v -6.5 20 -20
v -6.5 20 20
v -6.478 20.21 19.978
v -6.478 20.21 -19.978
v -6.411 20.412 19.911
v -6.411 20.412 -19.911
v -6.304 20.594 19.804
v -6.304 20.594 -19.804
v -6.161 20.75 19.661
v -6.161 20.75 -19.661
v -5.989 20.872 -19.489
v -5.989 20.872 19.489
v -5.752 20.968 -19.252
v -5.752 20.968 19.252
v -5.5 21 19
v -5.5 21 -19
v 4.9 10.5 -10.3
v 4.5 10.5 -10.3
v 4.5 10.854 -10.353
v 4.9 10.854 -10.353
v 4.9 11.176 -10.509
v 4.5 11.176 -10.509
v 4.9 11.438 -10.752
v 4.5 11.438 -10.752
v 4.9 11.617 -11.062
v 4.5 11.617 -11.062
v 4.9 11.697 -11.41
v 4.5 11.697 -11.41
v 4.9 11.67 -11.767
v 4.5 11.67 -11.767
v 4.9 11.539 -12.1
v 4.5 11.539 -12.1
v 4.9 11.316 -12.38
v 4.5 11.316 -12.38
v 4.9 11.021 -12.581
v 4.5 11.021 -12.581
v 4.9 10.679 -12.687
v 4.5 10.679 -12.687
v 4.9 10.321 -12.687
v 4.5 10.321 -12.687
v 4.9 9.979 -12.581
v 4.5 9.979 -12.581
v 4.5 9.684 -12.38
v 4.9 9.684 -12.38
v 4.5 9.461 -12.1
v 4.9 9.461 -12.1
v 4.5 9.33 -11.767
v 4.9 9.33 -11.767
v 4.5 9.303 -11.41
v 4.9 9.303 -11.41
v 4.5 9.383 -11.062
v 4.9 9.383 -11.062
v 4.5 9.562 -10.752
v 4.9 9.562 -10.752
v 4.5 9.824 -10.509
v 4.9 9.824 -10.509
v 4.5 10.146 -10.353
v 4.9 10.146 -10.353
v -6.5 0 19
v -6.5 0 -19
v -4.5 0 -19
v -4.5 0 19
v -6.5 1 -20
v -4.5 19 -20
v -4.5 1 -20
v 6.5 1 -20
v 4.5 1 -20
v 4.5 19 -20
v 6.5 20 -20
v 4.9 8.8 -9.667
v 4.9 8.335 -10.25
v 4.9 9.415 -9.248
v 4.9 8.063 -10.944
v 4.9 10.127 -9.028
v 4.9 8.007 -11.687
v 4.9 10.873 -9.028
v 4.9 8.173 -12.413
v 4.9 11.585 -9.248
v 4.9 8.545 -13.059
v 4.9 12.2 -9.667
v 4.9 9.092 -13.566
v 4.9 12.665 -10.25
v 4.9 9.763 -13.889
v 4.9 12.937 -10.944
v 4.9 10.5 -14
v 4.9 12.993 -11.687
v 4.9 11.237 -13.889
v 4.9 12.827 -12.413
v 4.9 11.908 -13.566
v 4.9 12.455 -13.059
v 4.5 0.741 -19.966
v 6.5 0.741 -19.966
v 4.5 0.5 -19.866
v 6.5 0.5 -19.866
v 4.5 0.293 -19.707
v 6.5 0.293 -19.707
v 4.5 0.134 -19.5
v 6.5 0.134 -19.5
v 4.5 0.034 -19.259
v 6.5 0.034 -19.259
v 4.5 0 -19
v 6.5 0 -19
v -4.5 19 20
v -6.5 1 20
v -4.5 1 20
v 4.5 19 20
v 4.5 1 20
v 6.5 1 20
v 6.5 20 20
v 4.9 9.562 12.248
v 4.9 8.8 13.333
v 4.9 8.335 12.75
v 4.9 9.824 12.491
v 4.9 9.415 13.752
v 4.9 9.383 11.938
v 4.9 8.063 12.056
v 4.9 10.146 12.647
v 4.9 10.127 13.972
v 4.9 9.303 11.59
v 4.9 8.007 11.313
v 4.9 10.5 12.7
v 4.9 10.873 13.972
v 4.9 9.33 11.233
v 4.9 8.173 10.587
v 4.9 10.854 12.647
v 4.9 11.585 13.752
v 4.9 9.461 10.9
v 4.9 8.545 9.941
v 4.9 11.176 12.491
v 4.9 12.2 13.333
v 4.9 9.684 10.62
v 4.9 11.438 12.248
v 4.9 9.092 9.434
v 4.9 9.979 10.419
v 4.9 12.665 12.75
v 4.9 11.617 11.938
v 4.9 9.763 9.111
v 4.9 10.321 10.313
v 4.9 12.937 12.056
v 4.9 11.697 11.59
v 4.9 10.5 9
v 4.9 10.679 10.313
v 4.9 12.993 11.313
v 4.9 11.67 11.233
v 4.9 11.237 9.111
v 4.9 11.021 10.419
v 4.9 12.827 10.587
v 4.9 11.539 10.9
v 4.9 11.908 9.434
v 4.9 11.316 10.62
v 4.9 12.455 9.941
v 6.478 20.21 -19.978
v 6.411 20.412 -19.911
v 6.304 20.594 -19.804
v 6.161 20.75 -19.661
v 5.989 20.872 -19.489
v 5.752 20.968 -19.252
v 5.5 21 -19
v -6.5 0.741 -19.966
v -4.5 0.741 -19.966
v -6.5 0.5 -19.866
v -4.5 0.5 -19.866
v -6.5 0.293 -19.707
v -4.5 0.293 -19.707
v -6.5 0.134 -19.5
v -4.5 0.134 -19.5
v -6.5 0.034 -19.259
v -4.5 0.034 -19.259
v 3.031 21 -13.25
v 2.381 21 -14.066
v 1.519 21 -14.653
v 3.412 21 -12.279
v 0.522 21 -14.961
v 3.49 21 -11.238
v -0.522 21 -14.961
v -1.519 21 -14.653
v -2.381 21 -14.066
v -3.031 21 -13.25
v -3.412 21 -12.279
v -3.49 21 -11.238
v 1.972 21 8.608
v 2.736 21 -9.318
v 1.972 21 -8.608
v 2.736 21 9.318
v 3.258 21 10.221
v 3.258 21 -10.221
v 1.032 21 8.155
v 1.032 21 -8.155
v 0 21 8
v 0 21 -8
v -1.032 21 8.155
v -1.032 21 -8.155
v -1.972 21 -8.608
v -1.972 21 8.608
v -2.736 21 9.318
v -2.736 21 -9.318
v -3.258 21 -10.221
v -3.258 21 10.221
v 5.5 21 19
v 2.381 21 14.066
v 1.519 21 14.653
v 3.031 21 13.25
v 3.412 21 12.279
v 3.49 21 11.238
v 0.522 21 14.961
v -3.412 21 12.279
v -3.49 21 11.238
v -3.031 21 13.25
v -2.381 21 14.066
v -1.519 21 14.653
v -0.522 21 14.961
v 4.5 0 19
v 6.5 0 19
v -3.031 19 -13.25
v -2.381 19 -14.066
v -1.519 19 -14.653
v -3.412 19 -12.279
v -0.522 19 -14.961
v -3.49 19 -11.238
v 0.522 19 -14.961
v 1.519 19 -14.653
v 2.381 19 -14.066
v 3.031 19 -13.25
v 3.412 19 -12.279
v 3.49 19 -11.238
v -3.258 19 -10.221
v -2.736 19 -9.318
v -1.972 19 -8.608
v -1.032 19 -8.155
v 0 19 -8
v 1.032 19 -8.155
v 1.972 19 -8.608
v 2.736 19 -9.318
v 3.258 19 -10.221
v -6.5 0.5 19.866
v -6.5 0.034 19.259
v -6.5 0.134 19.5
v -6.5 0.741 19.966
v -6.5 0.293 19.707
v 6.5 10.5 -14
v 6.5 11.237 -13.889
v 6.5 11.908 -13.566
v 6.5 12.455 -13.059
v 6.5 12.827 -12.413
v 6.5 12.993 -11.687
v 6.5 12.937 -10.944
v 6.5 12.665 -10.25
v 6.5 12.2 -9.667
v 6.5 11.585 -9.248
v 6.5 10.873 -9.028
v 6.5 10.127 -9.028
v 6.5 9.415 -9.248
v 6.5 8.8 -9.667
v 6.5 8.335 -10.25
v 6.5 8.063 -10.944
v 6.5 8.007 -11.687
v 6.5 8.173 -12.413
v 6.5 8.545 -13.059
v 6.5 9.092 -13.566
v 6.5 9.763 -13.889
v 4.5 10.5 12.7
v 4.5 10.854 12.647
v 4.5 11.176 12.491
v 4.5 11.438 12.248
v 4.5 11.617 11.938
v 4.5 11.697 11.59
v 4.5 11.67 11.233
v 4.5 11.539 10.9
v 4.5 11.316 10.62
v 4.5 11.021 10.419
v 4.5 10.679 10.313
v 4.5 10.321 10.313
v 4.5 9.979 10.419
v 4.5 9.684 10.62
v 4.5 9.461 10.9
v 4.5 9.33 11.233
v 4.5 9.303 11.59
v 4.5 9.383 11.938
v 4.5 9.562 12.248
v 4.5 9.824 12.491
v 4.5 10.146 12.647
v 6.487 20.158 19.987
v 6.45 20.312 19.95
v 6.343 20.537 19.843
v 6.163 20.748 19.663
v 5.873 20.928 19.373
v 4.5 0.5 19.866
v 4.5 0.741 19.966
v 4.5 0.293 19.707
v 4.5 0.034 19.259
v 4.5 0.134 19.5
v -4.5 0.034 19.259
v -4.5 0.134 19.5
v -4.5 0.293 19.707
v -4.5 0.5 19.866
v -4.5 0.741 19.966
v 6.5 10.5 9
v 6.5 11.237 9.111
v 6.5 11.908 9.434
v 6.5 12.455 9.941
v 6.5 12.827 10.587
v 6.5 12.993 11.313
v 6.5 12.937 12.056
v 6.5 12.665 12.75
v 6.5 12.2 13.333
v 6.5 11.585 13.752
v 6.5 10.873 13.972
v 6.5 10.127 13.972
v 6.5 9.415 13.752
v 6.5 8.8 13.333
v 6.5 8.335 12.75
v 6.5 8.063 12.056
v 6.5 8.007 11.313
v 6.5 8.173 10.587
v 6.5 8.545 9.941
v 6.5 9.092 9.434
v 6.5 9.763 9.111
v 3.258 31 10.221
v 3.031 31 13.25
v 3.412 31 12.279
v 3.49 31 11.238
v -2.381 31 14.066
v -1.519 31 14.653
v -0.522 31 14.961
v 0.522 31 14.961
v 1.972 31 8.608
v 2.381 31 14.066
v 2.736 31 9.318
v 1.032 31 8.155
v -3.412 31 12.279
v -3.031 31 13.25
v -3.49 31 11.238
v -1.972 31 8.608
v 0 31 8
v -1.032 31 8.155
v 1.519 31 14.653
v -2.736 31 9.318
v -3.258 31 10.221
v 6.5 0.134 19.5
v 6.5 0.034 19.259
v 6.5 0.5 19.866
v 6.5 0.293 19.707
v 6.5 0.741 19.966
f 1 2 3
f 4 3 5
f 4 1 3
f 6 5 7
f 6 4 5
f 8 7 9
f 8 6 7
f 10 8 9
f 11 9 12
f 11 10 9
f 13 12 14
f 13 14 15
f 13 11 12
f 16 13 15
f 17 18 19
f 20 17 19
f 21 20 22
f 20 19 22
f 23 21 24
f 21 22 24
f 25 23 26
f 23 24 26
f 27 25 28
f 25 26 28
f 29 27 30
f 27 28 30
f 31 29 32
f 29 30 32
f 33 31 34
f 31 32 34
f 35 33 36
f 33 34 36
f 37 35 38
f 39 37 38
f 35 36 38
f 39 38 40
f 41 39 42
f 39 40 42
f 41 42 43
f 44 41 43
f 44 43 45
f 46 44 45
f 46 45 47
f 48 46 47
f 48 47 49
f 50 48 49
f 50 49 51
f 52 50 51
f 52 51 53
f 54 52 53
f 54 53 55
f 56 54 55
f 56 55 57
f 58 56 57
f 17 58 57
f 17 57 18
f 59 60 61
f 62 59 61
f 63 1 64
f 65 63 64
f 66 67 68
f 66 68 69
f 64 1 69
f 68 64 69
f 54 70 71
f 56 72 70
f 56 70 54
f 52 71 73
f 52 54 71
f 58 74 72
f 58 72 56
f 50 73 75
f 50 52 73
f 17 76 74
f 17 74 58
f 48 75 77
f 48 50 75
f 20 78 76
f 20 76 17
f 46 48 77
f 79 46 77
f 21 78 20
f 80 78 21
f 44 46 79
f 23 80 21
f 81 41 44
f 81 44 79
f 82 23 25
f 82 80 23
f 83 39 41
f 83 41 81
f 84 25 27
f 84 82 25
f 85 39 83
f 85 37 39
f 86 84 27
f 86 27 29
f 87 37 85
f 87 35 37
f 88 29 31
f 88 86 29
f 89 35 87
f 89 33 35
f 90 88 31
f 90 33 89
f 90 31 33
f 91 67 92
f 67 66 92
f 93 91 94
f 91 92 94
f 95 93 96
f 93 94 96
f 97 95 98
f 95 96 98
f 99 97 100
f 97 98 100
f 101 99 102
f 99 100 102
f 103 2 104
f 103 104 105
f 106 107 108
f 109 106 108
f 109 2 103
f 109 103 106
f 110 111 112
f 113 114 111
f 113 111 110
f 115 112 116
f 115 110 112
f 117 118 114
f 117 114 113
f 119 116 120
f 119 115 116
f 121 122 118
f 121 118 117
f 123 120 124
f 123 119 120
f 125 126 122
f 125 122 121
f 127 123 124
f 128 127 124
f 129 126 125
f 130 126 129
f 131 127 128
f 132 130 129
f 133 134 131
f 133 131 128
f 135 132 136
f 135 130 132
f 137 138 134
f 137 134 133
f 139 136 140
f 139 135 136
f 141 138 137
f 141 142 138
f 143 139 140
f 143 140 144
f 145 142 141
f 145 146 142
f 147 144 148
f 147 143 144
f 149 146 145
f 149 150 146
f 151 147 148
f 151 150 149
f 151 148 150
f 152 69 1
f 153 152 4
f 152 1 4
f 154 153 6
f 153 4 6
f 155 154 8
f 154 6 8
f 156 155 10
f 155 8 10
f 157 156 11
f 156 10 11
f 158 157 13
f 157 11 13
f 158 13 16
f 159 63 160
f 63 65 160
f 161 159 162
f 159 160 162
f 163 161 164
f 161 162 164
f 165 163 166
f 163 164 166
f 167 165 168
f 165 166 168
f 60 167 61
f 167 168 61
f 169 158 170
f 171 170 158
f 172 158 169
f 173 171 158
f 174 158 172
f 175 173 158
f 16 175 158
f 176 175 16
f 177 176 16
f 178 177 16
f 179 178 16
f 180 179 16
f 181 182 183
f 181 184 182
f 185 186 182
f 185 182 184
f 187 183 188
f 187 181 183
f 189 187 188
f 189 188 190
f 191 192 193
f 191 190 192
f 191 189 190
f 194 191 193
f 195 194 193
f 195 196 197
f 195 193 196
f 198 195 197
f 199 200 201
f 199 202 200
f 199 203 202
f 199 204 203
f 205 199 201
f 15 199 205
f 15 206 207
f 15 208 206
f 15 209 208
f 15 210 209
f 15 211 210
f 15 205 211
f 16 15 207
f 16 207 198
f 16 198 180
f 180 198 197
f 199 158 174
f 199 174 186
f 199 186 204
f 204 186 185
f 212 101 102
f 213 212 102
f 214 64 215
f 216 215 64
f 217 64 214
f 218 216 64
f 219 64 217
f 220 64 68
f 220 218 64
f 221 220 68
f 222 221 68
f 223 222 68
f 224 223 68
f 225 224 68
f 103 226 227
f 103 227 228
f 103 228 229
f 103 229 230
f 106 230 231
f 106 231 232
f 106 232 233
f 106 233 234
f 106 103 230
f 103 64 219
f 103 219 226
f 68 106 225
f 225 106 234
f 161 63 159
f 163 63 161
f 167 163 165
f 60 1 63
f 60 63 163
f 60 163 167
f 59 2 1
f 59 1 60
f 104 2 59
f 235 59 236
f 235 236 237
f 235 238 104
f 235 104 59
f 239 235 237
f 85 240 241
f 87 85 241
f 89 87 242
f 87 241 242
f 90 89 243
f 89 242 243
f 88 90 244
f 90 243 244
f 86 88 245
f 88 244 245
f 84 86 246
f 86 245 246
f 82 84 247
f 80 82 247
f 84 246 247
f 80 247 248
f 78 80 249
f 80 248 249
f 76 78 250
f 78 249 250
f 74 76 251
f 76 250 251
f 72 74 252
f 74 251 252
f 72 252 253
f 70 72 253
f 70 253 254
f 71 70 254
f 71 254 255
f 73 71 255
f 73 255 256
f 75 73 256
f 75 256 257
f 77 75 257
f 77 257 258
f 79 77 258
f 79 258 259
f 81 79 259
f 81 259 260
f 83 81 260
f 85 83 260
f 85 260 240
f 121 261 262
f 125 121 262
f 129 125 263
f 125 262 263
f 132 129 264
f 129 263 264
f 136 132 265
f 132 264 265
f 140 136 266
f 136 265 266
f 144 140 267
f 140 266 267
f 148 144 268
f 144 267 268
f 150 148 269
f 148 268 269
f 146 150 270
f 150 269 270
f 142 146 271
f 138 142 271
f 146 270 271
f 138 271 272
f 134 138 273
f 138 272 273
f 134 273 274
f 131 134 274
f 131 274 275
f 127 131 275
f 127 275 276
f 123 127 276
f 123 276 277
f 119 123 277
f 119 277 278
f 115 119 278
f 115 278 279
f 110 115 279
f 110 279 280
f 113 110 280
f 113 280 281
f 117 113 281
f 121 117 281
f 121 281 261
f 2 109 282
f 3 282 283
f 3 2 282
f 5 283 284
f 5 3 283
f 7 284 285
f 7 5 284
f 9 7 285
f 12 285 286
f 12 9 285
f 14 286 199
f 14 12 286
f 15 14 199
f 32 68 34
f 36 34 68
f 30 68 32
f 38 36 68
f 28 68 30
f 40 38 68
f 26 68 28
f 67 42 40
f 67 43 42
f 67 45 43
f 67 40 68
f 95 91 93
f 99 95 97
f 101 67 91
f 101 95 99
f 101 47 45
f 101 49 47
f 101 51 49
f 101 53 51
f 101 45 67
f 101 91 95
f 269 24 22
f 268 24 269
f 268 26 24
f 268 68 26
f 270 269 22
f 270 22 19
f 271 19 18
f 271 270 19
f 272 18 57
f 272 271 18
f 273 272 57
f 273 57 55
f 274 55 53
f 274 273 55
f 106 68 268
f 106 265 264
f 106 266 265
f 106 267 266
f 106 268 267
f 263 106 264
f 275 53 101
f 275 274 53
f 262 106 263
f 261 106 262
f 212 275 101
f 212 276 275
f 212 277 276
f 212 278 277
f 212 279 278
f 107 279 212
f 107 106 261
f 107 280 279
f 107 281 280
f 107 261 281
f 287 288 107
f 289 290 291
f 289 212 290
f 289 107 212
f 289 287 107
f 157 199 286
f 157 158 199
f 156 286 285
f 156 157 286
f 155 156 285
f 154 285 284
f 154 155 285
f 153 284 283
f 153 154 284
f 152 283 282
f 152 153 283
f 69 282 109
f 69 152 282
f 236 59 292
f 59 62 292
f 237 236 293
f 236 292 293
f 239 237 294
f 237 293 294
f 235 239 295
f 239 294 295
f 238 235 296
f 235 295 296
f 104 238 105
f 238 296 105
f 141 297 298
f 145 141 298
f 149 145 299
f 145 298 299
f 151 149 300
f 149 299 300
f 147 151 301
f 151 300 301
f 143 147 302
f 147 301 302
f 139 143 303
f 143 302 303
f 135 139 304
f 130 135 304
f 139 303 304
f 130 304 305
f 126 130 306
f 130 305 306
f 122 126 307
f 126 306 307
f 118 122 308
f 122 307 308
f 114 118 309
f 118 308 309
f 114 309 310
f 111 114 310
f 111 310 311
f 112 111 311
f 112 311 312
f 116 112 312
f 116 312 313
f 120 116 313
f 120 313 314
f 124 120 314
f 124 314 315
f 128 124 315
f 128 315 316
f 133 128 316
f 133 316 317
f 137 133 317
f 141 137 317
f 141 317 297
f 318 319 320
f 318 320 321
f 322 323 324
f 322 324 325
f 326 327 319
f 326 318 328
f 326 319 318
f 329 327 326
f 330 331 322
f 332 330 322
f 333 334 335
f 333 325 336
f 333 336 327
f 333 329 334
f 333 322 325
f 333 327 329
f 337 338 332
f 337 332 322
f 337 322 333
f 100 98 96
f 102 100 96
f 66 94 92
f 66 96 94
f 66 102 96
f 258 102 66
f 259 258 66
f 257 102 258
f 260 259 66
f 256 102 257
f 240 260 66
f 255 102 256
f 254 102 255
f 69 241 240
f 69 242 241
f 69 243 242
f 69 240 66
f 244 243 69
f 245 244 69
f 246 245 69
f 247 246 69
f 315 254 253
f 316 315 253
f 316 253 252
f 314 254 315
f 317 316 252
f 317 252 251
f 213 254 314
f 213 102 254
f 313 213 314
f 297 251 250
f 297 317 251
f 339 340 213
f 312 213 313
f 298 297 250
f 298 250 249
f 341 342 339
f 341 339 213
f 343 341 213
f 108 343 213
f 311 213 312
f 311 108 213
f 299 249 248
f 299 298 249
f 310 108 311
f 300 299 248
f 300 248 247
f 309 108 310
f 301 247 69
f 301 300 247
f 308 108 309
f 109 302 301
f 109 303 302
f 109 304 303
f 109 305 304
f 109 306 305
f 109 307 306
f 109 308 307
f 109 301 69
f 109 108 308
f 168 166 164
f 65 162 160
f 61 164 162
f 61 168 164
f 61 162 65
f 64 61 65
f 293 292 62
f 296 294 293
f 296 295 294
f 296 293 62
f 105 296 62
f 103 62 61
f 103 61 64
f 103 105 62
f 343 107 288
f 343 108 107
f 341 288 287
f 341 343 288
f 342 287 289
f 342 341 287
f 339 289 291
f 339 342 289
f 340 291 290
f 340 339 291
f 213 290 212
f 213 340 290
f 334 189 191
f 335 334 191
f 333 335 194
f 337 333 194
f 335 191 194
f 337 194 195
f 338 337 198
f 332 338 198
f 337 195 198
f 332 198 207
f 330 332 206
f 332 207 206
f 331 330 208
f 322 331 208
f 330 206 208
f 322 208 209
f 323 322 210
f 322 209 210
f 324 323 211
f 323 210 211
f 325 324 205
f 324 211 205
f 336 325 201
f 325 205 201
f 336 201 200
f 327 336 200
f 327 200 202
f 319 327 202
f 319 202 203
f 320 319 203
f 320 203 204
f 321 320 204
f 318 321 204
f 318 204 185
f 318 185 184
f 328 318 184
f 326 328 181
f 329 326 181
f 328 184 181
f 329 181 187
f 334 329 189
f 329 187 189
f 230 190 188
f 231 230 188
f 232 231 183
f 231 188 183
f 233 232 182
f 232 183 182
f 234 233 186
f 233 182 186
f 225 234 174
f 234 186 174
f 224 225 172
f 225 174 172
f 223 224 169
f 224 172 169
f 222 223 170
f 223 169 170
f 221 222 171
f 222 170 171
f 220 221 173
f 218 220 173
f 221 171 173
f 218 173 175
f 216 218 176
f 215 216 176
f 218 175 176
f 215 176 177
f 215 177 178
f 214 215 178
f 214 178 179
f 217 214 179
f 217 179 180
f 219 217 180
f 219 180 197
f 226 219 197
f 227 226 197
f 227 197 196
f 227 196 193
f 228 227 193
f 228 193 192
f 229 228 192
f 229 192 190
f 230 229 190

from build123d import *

# Parameters (mm, degrees)
BOSS_EXTRUDE1_DEPTH                              = 20
CBORE_FOR_M2_PAN_HEAD_MACHINE_SCREW1_D           = 2.4
CBORE_FOR_M2_PAN_HEAD_MACHINE_SCREW1_DEPTH       = 2
CBORE_FOR_M2_PAN_HEAD_MACHINE_SCREW1_CBORE_D     = 5
CBORE_FOR_M2_PAN_HEAD_MACHINE_SCREW1_CBORE_DEPTH = 1.6
FILLET1_R                                        = 1
SKETCH4_4_R                                      = 3.5
BOSS_EXTRUDE3_DEPTH                              = 10
SKETCH4_5_R                                      = 3.5
CUT_EXTRUDE2_DEPTH                               = 10


with BuildPart() as part:
    # Sketch1 → Boss-Extrude1 (new, symmetric)
    with BuildSketch(Plane.XY):
        Polygon((-6.5, 21), (-6.5, 0), (-4.5, 0), (-4.5, 19), (0, 19), (0, 21), align=None)
        Polygon((0, 19), (4.5, 19), (4.5, 0), (6.5, 0), (6.5, 21), (0, 21), align=None)
    extrude(amount=BOSS_EXTRUDE1_DEPTH, both=True)

    # CBORE for M2 Pan Head Machine Screw1
    with Locations(Plane(origin=(6.5, 0, 0), x_dir=(0, 0, -1), z_dir=(1, 0, 0))):
        with Locations((-11.5, 10.5), (11.5, 10.5)):
            CounterBoreHole(CBORE_FOR_M2_PAN_HEAD_MACHINE_SCREW1_D / 2, CBORE_FOR_M2_PAN_HEAD_MACHINE_SCREW1_CBORE_D / 2, CBORE_FOR_M2_PAN_HEAD_MACHINE_SCREW1_CBORE_DEPTH, depth=CBORE_FOR_M2_PAN_HEAD_MACHINE_SCREW1_DEPTH)

    # Fillet1
    fillet1_edges = [part.edges().sort_by_distance(p)[0] for p in [
        (-5.5, 0, 20),
        (0, 21, -20),
        (5.5, 0, -20),
        (-5.5, 0, -20),
        (-6.5, 21, 0),
        (6.5, 21, 0),
        (5.5, 0, 20),
        (0, 21, 20),
    ]]
    fillet(fillet1_edges, radius=FILLET1_R)

    # Sketch4<4> → Boss-Extrude3 (add)
    with BuildSketch(Plane(origin=(0, 21, 0), x_dir=(1, 0, 0), z_dir=(0, 1, 0))):
        with Locations(Location((0, -11.5, 0), (0, 0, 90))):
            Circle(SKETCH4_4_R)
    extrude(amount=BOSS_EXTRUDE3_DEPTH)

    # Sketch4<5> → Cut-Extrude2 (cut)
    with BuildSketch(Plane(origin=(0, 21, 0), x_dir=(1, 0, 0), z_dir=(0, 1, 0))):
        with Locations(Location((0, 11.5, 0), (0, 0, 270))):
            Circle(SKETCH4_5_R)
    extrude(amount=-CUT_EXTRUDE2_DEPTH, mode=Mode.SUBTRACT)


solid = part.part
